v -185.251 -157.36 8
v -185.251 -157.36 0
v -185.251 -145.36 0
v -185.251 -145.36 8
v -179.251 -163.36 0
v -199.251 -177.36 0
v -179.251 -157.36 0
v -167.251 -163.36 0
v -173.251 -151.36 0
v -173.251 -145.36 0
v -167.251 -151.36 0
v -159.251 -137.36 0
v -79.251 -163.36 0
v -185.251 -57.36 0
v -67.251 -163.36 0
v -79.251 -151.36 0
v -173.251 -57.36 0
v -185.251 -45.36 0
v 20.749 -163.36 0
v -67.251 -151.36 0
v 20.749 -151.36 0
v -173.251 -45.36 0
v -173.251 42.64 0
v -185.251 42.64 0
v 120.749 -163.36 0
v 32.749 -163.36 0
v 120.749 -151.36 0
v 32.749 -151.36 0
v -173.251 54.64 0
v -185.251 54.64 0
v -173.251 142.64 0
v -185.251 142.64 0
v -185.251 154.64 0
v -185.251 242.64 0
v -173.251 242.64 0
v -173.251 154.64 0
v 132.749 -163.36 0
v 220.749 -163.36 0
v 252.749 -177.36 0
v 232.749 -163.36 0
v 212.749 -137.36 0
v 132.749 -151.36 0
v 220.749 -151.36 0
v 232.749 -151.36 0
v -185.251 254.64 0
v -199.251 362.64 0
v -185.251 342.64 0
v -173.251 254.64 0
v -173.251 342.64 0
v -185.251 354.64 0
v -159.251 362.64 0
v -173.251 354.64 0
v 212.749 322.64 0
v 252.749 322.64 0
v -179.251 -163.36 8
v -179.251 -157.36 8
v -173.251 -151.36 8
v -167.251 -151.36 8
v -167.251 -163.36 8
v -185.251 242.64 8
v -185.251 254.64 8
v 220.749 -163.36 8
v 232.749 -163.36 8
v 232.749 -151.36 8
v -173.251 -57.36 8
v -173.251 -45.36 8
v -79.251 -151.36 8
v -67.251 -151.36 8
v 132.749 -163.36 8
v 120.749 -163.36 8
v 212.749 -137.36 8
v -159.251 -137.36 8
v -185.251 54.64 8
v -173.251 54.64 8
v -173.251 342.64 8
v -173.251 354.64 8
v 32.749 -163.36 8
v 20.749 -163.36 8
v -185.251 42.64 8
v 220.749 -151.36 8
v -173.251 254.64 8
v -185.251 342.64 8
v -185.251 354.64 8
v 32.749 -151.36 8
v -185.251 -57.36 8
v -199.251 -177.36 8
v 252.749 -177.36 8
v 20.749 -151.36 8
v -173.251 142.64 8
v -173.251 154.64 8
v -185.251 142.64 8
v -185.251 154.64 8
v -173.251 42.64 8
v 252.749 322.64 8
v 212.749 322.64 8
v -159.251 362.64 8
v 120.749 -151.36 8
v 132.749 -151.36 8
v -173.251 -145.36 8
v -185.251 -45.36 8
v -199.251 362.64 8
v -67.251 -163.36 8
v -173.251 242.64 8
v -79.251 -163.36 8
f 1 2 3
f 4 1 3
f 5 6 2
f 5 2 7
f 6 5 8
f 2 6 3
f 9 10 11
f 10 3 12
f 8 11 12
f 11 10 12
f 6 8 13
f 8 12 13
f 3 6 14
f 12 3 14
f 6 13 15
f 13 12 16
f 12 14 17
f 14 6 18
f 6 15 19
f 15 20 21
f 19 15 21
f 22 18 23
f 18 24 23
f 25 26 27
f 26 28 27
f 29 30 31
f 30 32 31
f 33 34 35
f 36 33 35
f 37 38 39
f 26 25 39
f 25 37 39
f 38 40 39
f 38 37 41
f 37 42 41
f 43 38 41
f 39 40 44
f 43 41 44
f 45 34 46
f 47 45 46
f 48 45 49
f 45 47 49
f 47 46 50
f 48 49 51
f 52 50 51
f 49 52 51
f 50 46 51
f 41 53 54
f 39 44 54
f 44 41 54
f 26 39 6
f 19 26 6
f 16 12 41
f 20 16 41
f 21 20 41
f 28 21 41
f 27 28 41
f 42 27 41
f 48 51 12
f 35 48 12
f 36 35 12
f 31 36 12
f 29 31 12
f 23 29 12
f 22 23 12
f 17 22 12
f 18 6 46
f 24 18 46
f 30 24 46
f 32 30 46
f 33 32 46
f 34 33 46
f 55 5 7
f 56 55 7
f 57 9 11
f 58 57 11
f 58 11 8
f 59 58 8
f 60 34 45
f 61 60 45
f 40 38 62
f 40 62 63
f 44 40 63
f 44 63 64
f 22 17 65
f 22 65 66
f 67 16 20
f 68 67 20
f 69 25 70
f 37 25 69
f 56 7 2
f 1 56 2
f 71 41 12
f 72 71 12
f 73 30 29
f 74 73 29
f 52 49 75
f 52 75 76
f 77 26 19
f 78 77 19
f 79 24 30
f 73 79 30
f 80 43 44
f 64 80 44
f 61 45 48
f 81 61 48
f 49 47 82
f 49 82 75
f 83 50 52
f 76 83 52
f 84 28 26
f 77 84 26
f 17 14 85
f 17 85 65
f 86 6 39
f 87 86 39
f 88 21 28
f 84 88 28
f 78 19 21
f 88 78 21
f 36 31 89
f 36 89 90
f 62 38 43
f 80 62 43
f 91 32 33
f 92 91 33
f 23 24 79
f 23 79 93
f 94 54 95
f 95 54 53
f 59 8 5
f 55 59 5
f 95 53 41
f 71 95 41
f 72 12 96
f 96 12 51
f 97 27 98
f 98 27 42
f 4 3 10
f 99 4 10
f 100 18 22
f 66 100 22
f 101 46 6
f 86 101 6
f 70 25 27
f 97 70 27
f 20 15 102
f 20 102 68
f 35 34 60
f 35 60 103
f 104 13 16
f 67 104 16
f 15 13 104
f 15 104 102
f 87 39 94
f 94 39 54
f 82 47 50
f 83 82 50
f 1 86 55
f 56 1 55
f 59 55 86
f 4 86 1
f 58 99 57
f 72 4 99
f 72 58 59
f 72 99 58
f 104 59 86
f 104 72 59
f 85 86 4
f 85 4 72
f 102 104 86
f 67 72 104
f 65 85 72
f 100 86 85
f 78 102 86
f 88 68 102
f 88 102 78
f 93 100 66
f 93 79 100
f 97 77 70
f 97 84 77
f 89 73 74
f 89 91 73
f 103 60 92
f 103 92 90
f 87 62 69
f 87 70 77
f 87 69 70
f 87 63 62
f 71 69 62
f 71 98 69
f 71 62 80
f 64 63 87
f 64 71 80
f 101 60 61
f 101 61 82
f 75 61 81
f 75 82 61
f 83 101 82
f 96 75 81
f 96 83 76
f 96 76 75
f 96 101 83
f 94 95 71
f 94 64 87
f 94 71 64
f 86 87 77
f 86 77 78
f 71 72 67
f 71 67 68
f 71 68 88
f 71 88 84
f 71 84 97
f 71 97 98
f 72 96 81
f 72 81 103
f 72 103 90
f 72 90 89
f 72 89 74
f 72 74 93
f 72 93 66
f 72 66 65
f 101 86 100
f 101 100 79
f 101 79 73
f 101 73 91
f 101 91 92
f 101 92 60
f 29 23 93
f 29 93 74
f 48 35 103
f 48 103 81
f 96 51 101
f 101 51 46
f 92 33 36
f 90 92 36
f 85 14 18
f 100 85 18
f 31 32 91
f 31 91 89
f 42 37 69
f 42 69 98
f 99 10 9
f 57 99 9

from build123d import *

# Parameters (mm, degrees)
F0_W     = 12
F0_H     = 12
F1_DEPTH = 8


with BuildPart() as f1:
    # F0 (on Top) → F1 (new body)
    with BuildSketch(Plane.XY):
        Polygon((-199.250624, -177.360311), (252.749376, -177.360311), (252.749376, 322.639689), (212.749376, 322.639689), (212.749376, -137.360311), (26.749376, -137.360311), (-159.250624, -137.360311), (-159.250624, 362.639689), (-199.250624, 362.639689), align=None)
        Polygon((-179.250624, -163.360311), (-179.250624, -157.360311), (-185.250624, -157.360311), (-185.250624, -145.360311), (-173.250624, -145.360311), (-173.250624, -151.360311), (-167.250624, -151.360311), (-167.250624, -163.360311), align=None, mode=Mode.SUBTRACT)
        with Locations((-179.250624, -51.360311)):
            Rectangle(F0_W, F0_H, mode=Mode.SUBTRACT)
        with Locations((-73.250624, -157.360311)):
            Rectangle(F0_W, F0_H, mode=Mode.SUBTRACT)
        with Locations((-179.250624, 48.639689)):
            Rectangle(F0_W, F0_H, mode=Mode.SUBTRACT)
        Polygon((20.749376, -151.360311), (26.749376, -151.360311), (32.749376, -151.360311), (32.749376, -163.360311), (20.749376, -163.360311), align=None, mode=Mode.SUBTRACT)
        with Locations((126.749376, -157.360311)):
            Rectangle(F0_W, F0_H, mode=Mode.SUBTRACT)
        with Locations((226.749376, -157.360311)):
            Rectangle(F0_W, F0_H, mode=Mode.SUBTRACT)
        with Locations((-179.250624, 148.639689)):
            Rectangle(F0_W, F0_H, mode=Mode.SUBTRACT)
        with Locations((-179.250624, 248.639689)):
            Rectangle(F0_W, F0_H, mode=Mode.SUBTRACT)
        with Locations((-179.250624, 348.639689)):
            Rectangle(F0_W, F0_H, mode=Mode.SUBTRACT)
    extrude(amount=F1_DEPTH)


solid = f1.part
